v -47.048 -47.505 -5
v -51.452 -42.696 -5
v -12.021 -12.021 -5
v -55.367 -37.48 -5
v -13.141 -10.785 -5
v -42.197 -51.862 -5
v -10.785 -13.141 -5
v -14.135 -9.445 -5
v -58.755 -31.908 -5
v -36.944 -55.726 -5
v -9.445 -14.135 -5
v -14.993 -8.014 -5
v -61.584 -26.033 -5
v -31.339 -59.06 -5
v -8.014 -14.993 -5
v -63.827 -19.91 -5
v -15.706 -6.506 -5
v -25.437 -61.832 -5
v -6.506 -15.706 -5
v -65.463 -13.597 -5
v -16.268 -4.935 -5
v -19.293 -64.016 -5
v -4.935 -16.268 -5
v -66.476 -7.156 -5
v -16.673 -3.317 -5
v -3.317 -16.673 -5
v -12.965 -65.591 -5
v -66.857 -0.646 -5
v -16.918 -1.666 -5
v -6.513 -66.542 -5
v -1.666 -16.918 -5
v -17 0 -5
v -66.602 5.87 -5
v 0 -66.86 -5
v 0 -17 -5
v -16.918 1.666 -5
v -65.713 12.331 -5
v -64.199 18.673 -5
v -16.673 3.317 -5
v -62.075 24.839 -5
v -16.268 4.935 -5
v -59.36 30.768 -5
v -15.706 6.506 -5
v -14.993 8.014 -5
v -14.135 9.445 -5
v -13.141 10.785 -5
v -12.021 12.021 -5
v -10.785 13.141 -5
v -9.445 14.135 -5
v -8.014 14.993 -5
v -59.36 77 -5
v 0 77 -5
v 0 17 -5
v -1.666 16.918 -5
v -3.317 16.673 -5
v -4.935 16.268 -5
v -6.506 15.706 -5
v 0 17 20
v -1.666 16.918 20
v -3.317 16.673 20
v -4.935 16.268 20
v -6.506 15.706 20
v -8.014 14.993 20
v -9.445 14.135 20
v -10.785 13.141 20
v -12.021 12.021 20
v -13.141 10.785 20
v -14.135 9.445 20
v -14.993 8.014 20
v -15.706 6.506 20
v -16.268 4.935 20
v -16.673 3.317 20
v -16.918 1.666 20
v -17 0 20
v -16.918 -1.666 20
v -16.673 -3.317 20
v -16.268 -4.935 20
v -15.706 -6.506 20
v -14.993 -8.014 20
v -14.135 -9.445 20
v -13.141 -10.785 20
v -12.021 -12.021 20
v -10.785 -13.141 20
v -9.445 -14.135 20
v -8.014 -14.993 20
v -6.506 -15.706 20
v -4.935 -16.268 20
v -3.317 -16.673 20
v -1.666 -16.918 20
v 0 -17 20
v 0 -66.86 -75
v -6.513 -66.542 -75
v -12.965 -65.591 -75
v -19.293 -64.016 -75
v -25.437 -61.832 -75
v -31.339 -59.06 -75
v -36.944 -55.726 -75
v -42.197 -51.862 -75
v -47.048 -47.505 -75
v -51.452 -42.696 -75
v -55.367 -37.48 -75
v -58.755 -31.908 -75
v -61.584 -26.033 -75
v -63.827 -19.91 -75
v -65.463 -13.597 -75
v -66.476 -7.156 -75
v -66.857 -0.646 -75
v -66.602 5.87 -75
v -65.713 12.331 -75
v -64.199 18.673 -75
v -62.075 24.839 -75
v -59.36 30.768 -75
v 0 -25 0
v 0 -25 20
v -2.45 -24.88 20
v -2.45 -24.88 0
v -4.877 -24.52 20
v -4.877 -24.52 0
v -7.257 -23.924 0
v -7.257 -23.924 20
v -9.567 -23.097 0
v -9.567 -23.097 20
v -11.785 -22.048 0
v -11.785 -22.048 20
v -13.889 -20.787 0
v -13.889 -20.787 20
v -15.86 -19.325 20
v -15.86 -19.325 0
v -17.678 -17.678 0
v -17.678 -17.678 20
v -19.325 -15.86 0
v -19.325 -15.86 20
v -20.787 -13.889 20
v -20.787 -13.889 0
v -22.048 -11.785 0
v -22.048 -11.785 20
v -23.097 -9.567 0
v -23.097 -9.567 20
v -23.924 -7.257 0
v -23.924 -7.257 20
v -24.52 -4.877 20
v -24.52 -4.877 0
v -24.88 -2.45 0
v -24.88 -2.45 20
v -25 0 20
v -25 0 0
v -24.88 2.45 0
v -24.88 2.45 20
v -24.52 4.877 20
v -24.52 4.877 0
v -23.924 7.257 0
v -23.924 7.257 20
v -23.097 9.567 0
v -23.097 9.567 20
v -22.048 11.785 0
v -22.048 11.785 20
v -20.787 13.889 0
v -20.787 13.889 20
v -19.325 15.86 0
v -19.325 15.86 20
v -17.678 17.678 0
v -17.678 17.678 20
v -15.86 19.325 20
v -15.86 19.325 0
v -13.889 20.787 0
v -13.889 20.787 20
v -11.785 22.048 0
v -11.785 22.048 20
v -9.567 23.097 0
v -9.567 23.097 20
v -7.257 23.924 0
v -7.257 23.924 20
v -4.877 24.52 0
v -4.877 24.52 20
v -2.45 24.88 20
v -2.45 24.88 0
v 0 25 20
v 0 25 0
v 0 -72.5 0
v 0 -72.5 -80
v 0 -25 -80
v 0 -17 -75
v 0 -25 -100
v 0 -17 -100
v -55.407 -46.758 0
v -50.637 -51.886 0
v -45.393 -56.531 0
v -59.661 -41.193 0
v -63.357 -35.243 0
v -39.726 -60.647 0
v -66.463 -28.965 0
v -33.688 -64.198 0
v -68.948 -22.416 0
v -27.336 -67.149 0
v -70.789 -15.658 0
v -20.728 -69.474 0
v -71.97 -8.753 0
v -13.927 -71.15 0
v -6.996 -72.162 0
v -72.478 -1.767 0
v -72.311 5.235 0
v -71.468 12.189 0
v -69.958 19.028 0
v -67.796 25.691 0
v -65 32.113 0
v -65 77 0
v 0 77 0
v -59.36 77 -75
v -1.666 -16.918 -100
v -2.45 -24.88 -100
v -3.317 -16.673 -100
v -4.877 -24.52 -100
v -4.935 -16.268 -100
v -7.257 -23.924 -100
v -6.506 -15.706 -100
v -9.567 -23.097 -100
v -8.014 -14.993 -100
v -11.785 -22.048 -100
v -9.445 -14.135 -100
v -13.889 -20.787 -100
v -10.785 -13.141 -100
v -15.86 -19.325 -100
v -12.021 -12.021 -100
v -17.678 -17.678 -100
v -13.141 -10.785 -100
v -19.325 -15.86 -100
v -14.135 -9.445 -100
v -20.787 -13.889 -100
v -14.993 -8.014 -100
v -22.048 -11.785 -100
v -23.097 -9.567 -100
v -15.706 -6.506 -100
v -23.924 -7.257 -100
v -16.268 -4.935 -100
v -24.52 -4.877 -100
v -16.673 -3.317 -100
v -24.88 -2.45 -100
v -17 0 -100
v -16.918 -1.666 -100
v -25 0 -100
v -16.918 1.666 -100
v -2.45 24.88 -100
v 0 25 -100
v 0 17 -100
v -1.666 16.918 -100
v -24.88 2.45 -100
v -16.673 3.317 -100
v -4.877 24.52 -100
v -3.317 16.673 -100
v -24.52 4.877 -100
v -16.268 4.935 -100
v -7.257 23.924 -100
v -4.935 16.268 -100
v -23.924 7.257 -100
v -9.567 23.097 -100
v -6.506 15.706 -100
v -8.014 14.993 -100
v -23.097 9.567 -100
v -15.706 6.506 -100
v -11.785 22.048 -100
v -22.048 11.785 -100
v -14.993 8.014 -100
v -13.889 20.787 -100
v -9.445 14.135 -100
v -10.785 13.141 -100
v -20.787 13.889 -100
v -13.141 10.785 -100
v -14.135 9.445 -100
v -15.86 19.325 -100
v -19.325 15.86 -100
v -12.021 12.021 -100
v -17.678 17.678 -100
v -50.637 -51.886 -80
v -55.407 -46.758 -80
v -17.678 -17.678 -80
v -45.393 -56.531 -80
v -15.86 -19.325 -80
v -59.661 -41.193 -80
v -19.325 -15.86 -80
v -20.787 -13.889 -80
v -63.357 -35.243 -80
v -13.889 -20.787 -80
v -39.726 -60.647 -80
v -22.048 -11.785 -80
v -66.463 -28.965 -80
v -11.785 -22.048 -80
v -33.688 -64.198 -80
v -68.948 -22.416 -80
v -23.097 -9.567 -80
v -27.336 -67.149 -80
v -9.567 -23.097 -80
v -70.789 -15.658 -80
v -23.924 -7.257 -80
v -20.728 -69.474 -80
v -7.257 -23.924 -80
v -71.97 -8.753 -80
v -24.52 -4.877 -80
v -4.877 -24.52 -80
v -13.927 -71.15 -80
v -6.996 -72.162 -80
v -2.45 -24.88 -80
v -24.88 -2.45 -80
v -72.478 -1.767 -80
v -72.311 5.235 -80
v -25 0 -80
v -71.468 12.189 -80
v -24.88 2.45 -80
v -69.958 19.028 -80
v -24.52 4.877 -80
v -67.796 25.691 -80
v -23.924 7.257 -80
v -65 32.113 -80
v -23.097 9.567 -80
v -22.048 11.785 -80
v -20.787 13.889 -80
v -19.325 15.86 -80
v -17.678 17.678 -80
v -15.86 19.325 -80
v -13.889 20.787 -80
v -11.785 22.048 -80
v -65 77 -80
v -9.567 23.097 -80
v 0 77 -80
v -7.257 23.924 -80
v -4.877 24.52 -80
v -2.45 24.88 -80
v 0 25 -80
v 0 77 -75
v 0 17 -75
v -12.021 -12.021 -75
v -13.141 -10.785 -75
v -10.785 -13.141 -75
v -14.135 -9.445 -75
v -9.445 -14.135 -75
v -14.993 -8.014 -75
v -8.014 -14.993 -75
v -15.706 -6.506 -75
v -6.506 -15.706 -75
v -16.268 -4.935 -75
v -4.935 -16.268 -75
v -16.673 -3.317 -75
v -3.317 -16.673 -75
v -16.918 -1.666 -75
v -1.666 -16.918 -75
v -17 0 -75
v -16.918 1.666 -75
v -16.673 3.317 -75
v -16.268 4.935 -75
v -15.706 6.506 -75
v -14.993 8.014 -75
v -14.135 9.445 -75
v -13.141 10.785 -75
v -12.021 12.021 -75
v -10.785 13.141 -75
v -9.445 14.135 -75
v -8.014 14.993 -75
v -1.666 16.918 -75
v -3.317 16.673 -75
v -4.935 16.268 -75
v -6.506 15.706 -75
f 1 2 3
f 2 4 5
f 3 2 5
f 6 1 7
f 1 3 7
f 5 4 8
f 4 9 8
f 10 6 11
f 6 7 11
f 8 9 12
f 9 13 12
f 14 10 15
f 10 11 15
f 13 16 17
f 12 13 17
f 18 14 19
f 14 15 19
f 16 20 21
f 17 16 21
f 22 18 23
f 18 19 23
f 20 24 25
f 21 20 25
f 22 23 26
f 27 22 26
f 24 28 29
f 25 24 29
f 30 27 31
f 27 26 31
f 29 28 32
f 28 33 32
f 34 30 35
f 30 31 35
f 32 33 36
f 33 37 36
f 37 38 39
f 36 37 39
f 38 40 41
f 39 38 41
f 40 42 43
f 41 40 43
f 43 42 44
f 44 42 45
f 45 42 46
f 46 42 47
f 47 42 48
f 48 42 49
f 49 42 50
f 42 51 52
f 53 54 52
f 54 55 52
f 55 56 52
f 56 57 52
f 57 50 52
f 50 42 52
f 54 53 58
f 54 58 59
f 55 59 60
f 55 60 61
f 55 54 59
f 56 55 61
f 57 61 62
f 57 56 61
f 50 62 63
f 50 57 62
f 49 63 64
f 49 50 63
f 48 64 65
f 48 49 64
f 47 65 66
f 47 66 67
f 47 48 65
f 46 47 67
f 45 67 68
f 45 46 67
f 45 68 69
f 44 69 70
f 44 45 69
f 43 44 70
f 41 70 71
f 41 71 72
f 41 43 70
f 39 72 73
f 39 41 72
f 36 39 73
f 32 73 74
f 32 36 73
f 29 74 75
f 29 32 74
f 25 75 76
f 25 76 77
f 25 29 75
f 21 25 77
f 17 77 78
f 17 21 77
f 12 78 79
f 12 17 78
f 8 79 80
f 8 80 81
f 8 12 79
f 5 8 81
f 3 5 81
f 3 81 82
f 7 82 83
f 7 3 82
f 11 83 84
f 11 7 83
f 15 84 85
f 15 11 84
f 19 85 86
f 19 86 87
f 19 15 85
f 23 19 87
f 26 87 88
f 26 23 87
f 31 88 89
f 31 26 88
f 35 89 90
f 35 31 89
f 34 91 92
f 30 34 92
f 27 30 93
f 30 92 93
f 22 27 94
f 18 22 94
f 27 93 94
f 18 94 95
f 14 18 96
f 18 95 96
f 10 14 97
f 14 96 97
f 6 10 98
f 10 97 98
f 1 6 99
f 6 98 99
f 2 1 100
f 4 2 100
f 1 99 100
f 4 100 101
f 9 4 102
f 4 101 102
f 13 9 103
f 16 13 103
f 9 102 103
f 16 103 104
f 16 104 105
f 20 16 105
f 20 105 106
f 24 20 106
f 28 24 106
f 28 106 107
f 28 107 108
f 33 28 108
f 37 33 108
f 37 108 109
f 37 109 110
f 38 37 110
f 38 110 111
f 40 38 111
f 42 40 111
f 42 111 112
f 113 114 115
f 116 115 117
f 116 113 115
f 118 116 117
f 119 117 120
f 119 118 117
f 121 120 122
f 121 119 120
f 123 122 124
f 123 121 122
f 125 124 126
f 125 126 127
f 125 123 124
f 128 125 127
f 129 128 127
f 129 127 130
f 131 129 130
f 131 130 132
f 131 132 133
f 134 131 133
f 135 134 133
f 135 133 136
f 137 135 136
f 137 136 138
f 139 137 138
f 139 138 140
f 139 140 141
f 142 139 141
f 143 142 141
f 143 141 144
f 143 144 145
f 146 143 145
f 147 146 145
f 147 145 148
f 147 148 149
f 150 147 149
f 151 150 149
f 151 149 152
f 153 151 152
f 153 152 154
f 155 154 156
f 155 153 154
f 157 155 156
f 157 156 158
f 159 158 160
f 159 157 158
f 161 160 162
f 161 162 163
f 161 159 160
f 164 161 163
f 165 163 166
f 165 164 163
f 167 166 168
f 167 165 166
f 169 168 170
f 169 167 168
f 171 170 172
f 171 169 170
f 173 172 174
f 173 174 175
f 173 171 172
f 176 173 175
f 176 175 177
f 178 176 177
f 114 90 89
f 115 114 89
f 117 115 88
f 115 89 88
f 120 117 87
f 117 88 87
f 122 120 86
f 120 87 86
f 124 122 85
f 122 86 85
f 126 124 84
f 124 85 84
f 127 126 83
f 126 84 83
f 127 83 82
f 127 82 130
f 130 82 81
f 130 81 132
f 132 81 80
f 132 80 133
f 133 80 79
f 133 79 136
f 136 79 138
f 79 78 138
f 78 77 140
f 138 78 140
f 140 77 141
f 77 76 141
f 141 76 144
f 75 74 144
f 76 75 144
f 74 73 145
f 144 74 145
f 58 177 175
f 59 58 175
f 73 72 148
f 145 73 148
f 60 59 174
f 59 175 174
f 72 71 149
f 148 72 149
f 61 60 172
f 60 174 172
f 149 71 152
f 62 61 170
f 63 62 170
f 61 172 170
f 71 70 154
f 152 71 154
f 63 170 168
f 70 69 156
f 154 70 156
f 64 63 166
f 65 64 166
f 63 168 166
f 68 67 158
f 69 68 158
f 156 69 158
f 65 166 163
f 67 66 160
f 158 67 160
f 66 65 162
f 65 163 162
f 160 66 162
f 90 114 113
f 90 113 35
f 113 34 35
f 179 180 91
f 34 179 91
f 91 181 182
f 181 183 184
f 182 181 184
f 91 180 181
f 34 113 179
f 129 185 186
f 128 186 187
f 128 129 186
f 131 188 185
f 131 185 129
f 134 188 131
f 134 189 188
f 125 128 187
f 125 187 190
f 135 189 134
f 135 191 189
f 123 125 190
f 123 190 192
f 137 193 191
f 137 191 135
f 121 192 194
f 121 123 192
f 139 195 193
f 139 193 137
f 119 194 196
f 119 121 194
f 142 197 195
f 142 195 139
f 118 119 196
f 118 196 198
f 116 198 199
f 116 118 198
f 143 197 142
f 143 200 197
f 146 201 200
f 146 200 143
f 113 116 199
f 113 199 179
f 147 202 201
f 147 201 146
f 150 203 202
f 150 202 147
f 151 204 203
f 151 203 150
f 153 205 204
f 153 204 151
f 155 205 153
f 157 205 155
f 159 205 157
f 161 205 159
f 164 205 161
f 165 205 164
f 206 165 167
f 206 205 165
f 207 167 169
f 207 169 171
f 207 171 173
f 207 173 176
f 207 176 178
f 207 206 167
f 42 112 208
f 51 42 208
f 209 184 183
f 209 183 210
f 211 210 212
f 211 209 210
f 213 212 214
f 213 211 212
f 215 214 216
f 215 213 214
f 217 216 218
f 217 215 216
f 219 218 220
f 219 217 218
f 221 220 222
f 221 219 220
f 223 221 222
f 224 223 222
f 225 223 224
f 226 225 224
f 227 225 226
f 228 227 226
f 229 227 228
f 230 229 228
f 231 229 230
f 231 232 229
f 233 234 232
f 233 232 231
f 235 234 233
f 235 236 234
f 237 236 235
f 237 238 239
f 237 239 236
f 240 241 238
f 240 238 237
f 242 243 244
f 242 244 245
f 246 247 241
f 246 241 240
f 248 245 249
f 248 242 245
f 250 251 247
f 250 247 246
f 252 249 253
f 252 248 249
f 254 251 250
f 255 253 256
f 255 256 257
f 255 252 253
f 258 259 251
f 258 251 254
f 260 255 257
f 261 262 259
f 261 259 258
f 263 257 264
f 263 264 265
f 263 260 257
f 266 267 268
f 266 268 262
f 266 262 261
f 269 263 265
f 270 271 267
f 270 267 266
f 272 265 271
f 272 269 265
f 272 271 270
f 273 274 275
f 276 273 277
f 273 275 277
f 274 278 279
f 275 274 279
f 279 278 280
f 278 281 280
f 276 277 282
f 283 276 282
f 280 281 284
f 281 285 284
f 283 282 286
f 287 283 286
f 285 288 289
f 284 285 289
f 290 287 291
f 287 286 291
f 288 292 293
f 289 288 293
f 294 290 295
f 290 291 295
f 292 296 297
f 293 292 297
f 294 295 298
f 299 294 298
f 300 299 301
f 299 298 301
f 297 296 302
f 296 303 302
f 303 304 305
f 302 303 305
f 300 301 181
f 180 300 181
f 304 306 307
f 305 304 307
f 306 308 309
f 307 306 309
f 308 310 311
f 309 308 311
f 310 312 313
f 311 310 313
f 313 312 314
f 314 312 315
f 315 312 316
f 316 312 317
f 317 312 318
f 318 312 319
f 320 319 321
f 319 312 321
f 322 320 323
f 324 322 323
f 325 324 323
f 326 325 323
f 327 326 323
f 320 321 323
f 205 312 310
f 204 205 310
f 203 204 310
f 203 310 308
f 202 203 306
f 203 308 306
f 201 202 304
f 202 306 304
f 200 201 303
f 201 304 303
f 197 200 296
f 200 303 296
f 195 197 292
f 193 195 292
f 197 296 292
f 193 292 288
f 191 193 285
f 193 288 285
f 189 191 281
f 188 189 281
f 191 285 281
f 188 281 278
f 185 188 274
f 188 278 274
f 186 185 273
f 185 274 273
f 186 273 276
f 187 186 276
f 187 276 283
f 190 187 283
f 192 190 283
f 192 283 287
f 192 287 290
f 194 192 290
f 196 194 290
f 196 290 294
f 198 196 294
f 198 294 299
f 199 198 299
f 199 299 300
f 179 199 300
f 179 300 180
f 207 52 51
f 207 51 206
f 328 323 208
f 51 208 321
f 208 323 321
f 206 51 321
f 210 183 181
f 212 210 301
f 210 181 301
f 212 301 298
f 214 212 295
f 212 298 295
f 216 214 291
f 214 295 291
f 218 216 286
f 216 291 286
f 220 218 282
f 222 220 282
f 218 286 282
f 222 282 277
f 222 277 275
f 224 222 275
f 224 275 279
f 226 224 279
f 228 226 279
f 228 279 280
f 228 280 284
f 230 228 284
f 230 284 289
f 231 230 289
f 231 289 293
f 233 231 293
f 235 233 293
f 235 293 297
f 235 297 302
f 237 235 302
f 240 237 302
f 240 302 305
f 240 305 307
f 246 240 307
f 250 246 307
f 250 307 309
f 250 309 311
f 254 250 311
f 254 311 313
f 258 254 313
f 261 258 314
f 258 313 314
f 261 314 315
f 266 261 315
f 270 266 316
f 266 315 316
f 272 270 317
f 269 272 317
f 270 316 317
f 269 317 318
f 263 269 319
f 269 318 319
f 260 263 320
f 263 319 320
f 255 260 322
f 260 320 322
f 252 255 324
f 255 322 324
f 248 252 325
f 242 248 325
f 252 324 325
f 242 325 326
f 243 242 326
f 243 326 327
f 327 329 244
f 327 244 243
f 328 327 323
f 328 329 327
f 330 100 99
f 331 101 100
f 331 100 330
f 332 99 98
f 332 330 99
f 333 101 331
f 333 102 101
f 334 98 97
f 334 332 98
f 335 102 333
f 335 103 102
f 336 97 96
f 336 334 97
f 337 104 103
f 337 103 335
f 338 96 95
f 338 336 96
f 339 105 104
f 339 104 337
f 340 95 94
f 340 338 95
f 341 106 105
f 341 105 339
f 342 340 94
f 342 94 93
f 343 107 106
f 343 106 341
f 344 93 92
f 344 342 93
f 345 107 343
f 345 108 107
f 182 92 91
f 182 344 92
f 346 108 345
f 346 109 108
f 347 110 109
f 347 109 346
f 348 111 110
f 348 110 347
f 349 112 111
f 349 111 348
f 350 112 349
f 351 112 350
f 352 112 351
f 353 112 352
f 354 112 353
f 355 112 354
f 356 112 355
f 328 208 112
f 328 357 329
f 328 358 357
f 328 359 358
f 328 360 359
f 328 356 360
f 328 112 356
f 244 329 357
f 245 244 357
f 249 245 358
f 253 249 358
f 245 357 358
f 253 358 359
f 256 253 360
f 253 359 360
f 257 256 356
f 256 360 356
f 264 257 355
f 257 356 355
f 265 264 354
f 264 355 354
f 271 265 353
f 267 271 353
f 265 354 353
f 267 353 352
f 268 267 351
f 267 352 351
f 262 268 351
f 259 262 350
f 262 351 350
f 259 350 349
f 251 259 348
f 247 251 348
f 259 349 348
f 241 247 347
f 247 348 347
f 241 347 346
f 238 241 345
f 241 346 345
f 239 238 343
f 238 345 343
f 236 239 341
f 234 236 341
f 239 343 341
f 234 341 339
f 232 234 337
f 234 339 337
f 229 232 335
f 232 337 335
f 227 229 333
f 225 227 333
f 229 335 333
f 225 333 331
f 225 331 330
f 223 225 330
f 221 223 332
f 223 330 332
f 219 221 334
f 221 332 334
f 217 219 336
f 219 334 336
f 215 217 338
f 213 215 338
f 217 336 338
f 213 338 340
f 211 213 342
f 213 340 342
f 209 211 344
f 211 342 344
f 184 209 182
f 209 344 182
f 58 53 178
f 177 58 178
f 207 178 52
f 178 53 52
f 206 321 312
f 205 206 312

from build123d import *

# Parameters (mm, degrees)
BOSS_EXTRUDE1_DEPTH      = 20
BOSS_EXTRUDE1_DEPTH_BACK = 5
BOSS_EXTRUDE2_START      = -5
BOSS_EXTRUDE2_DEPTH      = 5
BOSS_EXTRUDE3_REACH      = 152.552
BOSS_EXTRUDE3_START      = -5


with BuildPart() as part:
    # Sketch1 → Boss-Extrude1 (new, two sides: drawn at the far end of the back side and taken through both)
    with BuildSketch(Plane.XY.offset(-BOSS_EXTRUDE1_DEPTH_BACK)):
        with BuildLine():
            Line((0, 25), (0, 17))
            ThreePointArc((0, 17), (-17, 0), (0, -17))
            Line((0, -17), (0, -25))
            ThreePointArc((0, -25), (-25, 0), (0, 25))
        make_face()
    extrude(amount=BOSS_EXTRUDE1_DEPTH + BOSS_EXTRUDE1_DEPTH_BACK)

    # Sketch2 → Boss-Extrude2 (add)
    with BuildSketch(Plane.XY.offset(BOSS_EXTRUDE2_START)):
        with BuildLine():
            Line((0, 25), (0, 77))
            Line((0, 77), (-65, 77))
            Line((-65, 77), (-65, 32.113081447))
            ThreePointArc((-65, 32.113081447), (-61.581037686, -38.262590053), (0, -72.5))
            Line((0, -72.5), (0, -25))
            ThreePointArc((0, -25), (-25, 0), (0, 25))
        make_face()
    extrude(amount=BOSS_EXTRUDE2_DEPTH)


with BuildPart() as body_2:
    # Mirror4: mirrored copy
    add(part.part.mirror(Plane.XY.offset(-40)))


with BuildPart() as part_1:
    add(part.part)

    # Sketch3 → Boss-Extrude3 (add, up to next)
    with BuildSketch(Plane(origin=(0, 0, -80), x_dir=(-1, 0, 0), z_dir=(0, 0, -1)).offset(BOSS_EXTRUDE3_START), mode=Mode.PRIVATE) as boss_extrude3_sk1:
        with BuildLine():
            Line((65, 77), (65, 32.113081447))
            ThreePointArc((65, 32.113081447), (61.581037686, -38.262590053), (0, -72.5))
            Line((0, -72.5), (0, -66.86))
            ThreePointArc((0, -66.86), (57.128742944, -34.735663656), (59.36, 30.767677845))
            Line((59.36, 30.767677845), (59.36, 77))
            Line((59.36, 77), (65, 77))
        make_face()
    boss_extrude3_tool1 = extrude(boss_extrude3_sk1.sketch, amount=-BOSS_EXTRUDE3_REACH, mode=Mode.PRIVATE) - part_1.part

    add(body_2.part)  # Boss-Extrude3 merges body 2
    add(boss_extrude3_tool1.solids().sort_by_distance((-61.02152, 53.883839, -75))[0])


solid = part_1.part
